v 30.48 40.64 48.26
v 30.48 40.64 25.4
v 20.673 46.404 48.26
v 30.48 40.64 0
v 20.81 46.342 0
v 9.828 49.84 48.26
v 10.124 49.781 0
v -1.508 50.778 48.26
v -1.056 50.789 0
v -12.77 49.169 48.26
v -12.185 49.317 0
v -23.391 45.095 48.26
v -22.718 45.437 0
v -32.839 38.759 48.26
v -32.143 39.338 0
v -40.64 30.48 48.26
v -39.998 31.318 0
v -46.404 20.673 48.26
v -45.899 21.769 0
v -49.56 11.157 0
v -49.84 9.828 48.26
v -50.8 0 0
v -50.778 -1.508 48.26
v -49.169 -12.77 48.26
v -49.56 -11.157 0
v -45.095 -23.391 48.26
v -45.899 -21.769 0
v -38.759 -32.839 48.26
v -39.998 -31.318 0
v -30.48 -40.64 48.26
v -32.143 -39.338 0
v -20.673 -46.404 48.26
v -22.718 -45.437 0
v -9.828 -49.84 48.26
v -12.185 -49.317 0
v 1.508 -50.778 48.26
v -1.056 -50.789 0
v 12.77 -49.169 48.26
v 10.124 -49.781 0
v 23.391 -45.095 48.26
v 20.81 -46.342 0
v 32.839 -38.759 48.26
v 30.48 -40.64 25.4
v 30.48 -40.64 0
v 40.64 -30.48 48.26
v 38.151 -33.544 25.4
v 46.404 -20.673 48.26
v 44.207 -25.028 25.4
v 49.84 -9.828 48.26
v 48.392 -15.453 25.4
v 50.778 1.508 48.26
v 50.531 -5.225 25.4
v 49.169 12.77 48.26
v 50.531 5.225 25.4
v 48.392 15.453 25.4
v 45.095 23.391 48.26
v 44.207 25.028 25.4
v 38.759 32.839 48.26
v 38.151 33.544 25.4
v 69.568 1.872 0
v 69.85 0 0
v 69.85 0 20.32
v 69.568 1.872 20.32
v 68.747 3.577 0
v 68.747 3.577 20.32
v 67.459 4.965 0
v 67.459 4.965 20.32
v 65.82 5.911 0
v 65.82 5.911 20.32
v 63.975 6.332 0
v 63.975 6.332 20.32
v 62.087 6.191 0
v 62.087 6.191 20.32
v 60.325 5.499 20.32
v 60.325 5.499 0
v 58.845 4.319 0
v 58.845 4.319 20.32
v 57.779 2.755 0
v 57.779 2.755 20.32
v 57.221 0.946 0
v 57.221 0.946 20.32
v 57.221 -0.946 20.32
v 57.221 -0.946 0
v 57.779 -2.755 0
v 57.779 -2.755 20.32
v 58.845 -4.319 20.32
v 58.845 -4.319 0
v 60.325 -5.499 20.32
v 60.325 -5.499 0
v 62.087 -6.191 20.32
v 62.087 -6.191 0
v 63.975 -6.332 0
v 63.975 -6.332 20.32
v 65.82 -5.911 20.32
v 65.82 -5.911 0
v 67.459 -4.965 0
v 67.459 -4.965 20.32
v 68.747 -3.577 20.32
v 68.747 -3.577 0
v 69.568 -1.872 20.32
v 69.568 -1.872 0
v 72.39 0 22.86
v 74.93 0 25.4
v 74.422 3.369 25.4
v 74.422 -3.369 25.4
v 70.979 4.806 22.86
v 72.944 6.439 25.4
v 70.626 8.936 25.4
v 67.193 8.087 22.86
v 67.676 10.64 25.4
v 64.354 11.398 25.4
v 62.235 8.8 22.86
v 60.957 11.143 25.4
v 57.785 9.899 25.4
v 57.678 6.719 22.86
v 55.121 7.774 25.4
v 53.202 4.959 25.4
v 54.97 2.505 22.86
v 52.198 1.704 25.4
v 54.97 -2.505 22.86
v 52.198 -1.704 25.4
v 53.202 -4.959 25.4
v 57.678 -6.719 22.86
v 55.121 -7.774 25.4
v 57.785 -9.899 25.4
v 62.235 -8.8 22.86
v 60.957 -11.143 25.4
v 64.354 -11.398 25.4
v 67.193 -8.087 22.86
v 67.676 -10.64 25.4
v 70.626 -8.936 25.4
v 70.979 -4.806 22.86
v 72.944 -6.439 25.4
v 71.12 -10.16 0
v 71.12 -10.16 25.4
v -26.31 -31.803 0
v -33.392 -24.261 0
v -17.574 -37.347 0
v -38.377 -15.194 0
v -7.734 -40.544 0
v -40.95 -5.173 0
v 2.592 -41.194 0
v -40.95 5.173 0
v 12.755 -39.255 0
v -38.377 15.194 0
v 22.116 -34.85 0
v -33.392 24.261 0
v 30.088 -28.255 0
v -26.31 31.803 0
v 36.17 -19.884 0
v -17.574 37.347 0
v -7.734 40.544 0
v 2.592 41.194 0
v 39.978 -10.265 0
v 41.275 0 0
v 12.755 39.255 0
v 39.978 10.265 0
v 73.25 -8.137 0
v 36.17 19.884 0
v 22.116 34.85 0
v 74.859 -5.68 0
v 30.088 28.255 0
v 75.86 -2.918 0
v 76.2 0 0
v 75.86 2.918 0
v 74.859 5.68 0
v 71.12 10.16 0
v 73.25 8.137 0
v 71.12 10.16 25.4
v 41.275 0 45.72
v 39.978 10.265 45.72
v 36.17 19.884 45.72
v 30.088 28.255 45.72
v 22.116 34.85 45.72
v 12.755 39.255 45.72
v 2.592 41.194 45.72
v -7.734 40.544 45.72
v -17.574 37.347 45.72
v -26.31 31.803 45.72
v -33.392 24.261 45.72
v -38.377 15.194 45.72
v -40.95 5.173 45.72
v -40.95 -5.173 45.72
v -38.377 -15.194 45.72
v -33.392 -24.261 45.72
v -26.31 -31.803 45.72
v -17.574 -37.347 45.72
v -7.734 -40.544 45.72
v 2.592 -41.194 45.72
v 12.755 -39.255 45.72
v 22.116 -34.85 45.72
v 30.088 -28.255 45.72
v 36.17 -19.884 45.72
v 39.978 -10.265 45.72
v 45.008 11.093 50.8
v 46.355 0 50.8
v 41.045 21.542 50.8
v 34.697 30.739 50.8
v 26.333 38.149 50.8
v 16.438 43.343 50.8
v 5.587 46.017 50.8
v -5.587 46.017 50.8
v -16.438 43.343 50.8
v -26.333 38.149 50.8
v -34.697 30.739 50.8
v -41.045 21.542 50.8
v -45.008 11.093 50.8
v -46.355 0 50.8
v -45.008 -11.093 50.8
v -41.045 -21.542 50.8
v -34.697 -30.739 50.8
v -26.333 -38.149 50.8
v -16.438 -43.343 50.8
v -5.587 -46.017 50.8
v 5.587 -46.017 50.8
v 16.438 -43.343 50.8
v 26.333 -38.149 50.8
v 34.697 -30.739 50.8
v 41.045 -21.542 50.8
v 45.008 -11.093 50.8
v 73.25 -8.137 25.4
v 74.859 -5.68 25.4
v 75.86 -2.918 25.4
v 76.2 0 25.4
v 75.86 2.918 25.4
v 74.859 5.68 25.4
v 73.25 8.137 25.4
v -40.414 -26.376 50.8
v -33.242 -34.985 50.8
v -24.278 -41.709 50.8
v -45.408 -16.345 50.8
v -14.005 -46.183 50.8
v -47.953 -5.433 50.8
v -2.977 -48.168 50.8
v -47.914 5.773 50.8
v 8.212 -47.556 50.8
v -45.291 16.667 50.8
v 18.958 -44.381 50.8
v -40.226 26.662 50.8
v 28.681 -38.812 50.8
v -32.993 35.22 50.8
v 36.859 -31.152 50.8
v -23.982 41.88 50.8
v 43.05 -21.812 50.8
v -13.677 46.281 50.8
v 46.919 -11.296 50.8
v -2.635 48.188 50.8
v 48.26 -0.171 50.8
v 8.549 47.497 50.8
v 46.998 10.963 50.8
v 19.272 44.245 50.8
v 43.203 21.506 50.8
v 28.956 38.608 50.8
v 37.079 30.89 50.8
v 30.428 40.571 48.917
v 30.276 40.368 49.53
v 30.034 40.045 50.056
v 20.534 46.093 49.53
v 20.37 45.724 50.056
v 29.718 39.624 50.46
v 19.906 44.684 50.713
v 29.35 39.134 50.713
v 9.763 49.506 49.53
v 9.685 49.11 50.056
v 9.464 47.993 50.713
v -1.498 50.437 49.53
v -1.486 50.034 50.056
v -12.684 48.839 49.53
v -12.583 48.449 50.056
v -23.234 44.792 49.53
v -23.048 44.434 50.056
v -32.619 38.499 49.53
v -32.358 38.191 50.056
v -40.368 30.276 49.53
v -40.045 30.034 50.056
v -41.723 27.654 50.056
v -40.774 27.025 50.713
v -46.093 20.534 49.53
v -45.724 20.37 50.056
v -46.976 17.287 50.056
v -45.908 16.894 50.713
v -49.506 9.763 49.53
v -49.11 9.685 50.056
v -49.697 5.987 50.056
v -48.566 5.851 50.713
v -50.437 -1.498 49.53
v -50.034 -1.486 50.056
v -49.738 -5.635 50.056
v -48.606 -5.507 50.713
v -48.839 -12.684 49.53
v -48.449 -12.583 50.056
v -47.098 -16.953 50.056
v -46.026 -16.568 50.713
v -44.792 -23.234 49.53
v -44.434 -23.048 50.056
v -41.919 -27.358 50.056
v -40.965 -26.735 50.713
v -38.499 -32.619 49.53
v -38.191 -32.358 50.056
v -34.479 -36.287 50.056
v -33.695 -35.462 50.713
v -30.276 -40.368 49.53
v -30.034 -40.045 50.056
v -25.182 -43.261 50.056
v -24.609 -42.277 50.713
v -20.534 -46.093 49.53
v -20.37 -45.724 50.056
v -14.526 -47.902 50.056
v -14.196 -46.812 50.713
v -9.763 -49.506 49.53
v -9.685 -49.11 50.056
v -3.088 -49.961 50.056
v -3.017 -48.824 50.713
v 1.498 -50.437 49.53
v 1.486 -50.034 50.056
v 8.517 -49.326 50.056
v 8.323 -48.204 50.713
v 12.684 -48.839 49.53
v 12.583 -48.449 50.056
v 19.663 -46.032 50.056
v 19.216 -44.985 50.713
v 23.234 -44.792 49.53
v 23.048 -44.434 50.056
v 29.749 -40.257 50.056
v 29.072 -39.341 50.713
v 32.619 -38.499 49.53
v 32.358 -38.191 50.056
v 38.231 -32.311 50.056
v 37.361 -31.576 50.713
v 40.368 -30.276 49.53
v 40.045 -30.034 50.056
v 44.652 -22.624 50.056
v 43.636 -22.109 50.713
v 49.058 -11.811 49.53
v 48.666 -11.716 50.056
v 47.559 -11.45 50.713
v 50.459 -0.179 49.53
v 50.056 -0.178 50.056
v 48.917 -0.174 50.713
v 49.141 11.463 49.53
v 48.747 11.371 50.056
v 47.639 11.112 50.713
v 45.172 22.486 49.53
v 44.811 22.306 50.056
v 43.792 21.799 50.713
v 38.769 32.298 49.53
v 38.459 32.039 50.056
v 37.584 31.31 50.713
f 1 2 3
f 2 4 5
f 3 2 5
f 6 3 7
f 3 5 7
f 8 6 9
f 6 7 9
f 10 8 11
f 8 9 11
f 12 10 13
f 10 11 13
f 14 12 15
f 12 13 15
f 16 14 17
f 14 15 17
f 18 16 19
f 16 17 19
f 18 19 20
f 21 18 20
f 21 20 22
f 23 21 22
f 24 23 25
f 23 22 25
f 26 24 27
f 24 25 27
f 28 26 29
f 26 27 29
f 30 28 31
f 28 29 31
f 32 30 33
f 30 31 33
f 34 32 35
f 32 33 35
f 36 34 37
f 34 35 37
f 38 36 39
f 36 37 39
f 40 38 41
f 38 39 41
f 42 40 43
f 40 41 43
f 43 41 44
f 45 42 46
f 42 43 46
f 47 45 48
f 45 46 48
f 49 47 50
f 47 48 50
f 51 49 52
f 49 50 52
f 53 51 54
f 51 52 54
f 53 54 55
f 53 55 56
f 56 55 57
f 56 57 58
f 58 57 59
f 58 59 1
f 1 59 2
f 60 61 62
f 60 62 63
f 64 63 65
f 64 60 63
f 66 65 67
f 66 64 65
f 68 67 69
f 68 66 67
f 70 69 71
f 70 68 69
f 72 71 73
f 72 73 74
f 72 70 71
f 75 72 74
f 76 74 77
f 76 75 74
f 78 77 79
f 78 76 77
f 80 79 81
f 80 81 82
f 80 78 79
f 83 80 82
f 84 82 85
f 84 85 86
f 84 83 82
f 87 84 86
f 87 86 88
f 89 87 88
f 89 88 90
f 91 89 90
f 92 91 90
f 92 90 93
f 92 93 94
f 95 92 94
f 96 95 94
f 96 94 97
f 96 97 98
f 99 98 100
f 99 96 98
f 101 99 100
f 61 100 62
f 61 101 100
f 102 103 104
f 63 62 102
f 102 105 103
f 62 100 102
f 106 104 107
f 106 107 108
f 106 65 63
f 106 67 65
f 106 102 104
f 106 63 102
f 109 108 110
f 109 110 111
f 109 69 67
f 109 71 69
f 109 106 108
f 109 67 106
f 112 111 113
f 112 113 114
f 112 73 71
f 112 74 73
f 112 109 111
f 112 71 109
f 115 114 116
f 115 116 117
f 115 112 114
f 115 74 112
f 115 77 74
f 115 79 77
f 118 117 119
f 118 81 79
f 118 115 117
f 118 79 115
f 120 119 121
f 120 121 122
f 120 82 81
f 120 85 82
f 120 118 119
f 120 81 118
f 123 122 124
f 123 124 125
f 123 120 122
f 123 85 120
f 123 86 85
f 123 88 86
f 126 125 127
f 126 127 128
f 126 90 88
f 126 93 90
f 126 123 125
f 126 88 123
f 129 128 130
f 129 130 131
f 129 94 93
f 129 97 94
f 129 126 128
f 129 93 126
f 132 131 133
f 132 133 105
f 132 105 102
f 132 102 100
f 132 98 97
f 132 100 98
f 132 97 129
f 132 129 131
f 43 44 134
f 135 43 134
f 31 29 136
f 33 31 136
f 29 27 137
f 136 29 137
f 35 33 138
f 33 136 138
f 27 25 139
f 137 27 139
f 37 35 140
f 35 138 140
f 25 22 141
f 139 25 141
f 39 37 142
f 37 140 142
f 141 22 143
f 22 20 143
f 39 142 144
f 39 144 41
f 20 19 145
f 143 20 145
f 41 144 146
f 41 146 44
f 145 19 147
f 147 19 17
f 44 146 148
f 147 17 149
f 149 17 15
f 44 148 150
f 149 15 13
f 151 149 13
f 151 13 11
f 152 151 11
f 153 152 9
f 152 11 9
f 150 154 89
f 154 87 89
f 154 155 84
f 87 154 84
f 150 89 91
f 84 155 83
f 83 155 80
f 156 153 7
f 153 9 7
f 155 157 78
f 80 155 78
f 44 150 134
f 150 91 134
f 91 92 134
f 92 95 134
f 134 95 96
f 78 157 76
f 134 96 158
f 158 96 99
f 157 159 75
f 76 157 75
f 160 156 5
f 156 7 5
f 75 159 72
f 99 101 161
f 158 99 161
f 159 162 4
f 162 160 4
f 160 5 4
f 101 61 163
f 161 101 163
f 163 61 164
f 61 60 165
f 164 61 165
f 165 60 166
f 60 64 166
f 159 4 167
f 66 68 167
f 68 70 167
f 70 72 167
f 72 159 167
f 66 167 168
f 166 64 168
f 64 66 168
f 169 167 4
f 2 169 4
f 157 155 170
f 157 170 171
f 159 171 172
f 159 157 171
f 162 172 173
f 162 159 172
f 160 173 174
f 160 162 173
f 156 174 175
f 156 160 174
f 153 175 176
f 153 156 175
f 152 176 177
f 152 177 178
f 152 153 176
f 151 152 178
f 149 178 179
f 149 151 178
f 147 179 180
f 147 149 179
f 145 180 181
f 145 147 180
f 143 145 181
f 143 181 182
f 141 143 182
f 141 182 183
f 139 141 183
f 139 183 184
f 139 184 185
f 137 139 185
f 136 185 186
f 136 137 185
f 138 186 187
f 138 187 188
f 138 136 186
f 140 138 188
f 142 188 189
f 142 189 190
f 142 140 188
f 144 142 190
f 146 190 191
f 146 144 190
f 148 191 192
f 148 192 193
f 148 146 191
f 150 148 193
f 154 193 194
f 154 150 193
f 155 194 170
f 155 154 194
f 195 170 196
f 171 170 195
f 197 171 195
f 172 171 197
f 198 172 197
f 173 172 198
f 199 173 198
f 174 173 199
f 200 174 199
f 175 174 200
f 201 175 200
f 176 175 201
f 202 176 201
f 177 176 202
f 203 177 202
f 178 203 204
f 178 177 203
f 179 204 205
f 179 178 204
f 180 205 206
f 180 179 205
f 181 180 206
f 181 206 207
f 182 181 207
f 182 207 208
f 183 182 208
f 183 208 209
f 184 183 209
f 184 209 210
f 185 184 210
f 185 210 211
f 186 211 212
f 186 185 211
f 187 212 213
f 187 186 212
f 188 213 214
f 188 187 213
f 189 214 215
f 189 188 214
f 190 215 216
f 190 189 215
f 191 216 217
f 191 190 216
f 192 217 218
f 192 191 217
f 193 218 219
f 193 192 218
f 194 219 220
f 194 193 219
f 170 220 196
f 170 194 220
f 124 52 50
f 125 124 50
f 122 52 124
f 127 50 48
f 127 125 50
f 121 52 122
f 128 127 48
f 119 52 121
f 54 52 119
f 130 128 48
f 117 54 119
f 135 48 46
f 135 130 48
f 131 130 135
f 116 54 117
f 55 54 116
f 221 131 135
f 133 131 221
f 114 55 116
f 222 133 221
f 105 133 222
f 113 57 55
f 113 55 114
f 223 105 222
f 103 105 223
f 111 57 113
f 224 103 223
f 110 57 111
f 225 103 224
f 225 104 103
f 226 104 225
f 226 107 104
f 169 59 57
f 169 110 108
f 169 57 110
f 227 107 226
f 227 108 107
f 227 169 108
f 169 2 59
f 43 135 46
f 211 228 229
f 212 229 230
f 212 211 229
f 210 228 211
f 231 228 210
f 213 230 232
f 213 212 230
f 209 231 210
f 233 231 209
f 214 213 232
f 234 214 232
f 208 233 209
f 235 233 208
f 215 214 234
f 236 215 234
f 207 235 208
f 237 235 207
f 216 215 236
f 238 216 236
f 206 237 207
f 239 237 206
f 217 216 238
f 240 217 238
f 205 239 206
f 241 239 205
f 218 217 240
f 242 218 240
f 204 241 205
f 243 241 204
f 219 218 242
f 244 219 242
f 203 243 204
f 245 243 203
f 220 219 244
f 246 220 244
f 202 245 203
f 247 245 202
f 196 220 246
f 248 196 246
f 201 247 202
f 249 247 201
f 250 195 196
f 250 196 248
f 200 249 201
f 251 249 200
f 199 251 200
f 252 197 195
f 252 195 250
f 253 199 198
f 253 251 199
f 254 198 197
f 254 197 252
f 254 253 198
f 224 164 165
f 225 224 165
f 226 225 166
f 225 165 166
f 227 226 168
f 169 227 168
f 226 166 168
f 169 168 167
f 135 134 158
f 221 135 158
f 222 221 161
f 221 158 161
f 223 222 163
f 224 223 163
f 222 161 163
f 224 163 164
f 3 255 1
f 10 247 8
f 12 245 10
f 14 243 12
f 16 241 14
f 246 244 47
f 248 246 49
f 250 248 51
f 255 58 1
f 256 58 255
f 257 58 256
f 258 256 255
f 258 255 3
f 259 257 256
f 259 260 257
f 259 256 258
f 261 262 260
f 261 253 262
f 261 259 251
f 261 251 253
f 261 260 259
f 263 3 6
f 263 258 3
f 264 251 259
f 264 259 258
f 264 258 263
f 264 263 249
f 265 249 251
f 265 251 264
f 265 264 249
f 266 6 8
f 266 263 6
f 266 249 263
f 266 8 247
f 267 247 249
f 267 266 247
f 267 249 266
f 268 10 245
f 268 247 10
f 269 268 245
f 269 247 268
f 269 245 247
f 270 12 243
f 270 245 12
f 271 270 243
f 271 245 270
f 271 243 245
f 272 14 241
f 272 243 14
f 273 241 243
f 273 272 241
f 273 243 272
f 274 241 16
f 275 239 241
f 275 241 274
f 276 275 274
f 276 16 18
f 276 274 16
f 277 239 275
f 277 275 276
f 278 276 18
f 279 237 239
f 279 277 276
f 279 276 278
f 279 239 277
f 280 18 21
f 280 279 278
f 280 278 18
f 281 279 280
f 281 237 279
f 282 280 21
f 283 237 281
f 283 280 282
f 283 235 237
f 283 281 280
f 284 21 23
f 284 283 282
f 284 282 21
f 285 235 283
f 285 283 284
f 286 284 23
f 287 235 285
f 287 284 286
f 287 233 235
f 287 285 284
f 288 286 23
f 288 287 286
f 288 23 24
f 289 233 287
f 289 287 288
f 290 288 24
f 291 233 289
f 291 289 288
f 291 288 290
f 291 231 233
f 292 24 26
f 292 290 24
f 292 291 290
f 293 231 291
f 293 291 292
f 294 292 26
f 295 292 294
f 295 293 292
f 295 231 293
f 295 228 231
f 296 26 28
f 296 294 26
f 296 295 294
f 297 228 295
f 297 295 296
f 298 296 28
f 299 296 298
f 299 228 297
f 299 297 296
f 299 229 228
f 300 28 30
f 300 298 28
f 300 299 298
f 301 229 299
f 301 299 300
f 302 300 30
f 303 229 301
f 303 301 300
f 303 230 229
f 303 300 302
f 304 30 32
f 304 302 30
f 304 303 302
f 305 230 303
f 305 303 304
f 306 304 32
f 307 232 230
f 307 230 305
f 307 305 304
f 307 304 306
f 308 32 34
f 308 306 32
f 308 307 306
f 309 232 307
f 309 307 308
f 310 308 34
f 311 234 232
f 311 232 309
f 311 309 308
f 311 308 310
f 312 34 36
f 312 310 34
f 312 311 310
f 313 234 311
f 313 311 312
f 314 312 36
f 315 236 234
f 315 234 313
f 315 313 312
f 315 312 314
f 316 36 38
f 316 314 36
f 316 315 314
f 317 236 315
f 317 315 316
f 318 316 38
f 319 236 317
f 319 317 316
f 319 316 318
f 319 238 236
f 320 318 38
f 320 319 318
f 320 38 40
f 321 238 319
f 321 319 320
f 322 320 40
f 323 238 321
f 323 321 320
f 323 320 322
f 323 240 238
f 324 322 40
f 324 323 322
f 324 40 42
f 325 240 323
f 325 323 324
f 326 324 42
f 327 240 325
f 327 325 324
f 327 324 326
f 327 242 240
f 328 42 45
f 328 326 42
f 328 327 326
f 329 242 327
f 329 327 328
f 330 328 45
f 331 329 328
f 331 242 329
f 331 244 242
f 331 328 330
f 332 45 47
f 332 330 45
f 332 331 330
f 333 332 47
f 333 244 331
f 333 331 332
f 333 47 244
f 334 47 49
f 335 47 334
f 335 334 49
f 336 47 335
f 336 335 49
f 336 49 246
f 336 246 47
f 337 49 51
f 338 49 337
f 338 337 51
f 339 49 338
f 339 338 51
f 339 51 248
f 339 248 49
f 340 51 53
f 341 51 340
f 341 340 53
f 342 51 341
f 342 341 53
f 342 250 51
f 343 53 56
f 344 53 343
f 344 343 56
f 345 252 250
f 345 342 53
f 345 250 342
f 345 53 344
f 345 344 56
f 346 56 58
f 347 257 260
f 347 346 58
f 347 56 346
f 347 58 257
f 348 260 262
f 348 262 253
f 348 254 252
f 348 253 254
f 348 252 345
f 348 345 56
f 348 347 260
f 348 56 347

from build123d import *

# Parameters (mm, degrees)
F0_R     = 41.275
F0_R_2   = 6.35
F1_DEPTH = 25.4
F2_DEPTH = 50.8
F3_R     = 2.54
F4_SIZE  = 5.08


# Not quite as in the source:
# - a feature names something its author has since deleted; it is built from what else it names


with BuildPart() as f1:
    # F0 (on Top) → F1 (new body)
    with BuildSketch(Plane.XY):
        with BuildLine():
            ThreePointArc((30.48, -40.64), (45.4369013028, -22.7184506514), (50.8, 0))
            ThreePointArc((50.8, 0), (45.4369013028, 22.7184506514), (30.48, 40.64))
            ThreePointArc((30.48, 40.64), (-50.8, 0), (30.48, -40.64))
        make_face()
        Circle(F0_R, mode=Mode.SUBTRACT)
        with BuildLine():
            ThreePointArc((71.12, 10.16), (57.8203873372, 11.3592253257), (50.8, 0))
            ThreePointArc((50.8, 0), (57.8203873372, -11.3592253257), (71.12, -10.16))
            ThreePointArc((71.12, -10.16), (74.8592253257, -5.6796126628), (76.2, 0))
            ThreePointArc((76.2, 0), (74.8592253257, 5.6796126628), (71.12, 10.16))
        make_face()
        with Locations((63.5, 0)):
            Circle(F0_R_2, mode=Mode.SUBTRACT)
        with BuildLine():
            ThreePointArc((71.12, -10.16), (57.8203873372, -11.3592253257), (50.8, 0))
            ThreePointArc((50.8, 0), (45.4369013028, -22.7184506514), (30.48, -40.64))
            Line((30.48, -40.64), (71.12, -10.16))
        make_face()
        with BuildLine():
            ThreePointArc((30.48, 40.64), (45.4369013028, 22.7184506514), (50.8, 0))
            ThreePointArc((50.8, 0), (57.8203873372, 11.3592253257), (71.12, 10.16))
            Line((71.12, 10.16), (30.48, 40.64))
        make_face()
    extrude(amount=F1_DEPTH)

    # F0 (on Top) → F2 (join)
    with BuildSketch(Plane.XY):
        with BuildLine():
            ThreePointArc((30.48, -40.64), (45.4369013028, -22.7184506514), (50.8, 0))
            ThreePointArc((50.8, 0), (45.4369013028, 22.7184506514), (30.48, 40.64))
            ThreePointArc((30.48, 40.64), (-50.8, 0), (30.48, -40.64))
        make_face()
        Circle(F0_R, mode=Mode.SUBTRACT)
    extrude(amount=F2_DEPTH)

    # F3
    f3_edges = [f1.edges().sort_by_distance(p)[0] for p in [
        (-30.48, 40.64, 50.8),
    ]]
    fillet(f3_edges, radius=F3_R)

    # F4
    f4_edges = [f1.edges().sort_by_distance(p)[0] for p in [
        (-41.275, 0, 50.8),
        (57.15, 0, 25.4),
    ]]
    chamfer(f4_edges, length=F4_SIZE)


solid = f1.part
